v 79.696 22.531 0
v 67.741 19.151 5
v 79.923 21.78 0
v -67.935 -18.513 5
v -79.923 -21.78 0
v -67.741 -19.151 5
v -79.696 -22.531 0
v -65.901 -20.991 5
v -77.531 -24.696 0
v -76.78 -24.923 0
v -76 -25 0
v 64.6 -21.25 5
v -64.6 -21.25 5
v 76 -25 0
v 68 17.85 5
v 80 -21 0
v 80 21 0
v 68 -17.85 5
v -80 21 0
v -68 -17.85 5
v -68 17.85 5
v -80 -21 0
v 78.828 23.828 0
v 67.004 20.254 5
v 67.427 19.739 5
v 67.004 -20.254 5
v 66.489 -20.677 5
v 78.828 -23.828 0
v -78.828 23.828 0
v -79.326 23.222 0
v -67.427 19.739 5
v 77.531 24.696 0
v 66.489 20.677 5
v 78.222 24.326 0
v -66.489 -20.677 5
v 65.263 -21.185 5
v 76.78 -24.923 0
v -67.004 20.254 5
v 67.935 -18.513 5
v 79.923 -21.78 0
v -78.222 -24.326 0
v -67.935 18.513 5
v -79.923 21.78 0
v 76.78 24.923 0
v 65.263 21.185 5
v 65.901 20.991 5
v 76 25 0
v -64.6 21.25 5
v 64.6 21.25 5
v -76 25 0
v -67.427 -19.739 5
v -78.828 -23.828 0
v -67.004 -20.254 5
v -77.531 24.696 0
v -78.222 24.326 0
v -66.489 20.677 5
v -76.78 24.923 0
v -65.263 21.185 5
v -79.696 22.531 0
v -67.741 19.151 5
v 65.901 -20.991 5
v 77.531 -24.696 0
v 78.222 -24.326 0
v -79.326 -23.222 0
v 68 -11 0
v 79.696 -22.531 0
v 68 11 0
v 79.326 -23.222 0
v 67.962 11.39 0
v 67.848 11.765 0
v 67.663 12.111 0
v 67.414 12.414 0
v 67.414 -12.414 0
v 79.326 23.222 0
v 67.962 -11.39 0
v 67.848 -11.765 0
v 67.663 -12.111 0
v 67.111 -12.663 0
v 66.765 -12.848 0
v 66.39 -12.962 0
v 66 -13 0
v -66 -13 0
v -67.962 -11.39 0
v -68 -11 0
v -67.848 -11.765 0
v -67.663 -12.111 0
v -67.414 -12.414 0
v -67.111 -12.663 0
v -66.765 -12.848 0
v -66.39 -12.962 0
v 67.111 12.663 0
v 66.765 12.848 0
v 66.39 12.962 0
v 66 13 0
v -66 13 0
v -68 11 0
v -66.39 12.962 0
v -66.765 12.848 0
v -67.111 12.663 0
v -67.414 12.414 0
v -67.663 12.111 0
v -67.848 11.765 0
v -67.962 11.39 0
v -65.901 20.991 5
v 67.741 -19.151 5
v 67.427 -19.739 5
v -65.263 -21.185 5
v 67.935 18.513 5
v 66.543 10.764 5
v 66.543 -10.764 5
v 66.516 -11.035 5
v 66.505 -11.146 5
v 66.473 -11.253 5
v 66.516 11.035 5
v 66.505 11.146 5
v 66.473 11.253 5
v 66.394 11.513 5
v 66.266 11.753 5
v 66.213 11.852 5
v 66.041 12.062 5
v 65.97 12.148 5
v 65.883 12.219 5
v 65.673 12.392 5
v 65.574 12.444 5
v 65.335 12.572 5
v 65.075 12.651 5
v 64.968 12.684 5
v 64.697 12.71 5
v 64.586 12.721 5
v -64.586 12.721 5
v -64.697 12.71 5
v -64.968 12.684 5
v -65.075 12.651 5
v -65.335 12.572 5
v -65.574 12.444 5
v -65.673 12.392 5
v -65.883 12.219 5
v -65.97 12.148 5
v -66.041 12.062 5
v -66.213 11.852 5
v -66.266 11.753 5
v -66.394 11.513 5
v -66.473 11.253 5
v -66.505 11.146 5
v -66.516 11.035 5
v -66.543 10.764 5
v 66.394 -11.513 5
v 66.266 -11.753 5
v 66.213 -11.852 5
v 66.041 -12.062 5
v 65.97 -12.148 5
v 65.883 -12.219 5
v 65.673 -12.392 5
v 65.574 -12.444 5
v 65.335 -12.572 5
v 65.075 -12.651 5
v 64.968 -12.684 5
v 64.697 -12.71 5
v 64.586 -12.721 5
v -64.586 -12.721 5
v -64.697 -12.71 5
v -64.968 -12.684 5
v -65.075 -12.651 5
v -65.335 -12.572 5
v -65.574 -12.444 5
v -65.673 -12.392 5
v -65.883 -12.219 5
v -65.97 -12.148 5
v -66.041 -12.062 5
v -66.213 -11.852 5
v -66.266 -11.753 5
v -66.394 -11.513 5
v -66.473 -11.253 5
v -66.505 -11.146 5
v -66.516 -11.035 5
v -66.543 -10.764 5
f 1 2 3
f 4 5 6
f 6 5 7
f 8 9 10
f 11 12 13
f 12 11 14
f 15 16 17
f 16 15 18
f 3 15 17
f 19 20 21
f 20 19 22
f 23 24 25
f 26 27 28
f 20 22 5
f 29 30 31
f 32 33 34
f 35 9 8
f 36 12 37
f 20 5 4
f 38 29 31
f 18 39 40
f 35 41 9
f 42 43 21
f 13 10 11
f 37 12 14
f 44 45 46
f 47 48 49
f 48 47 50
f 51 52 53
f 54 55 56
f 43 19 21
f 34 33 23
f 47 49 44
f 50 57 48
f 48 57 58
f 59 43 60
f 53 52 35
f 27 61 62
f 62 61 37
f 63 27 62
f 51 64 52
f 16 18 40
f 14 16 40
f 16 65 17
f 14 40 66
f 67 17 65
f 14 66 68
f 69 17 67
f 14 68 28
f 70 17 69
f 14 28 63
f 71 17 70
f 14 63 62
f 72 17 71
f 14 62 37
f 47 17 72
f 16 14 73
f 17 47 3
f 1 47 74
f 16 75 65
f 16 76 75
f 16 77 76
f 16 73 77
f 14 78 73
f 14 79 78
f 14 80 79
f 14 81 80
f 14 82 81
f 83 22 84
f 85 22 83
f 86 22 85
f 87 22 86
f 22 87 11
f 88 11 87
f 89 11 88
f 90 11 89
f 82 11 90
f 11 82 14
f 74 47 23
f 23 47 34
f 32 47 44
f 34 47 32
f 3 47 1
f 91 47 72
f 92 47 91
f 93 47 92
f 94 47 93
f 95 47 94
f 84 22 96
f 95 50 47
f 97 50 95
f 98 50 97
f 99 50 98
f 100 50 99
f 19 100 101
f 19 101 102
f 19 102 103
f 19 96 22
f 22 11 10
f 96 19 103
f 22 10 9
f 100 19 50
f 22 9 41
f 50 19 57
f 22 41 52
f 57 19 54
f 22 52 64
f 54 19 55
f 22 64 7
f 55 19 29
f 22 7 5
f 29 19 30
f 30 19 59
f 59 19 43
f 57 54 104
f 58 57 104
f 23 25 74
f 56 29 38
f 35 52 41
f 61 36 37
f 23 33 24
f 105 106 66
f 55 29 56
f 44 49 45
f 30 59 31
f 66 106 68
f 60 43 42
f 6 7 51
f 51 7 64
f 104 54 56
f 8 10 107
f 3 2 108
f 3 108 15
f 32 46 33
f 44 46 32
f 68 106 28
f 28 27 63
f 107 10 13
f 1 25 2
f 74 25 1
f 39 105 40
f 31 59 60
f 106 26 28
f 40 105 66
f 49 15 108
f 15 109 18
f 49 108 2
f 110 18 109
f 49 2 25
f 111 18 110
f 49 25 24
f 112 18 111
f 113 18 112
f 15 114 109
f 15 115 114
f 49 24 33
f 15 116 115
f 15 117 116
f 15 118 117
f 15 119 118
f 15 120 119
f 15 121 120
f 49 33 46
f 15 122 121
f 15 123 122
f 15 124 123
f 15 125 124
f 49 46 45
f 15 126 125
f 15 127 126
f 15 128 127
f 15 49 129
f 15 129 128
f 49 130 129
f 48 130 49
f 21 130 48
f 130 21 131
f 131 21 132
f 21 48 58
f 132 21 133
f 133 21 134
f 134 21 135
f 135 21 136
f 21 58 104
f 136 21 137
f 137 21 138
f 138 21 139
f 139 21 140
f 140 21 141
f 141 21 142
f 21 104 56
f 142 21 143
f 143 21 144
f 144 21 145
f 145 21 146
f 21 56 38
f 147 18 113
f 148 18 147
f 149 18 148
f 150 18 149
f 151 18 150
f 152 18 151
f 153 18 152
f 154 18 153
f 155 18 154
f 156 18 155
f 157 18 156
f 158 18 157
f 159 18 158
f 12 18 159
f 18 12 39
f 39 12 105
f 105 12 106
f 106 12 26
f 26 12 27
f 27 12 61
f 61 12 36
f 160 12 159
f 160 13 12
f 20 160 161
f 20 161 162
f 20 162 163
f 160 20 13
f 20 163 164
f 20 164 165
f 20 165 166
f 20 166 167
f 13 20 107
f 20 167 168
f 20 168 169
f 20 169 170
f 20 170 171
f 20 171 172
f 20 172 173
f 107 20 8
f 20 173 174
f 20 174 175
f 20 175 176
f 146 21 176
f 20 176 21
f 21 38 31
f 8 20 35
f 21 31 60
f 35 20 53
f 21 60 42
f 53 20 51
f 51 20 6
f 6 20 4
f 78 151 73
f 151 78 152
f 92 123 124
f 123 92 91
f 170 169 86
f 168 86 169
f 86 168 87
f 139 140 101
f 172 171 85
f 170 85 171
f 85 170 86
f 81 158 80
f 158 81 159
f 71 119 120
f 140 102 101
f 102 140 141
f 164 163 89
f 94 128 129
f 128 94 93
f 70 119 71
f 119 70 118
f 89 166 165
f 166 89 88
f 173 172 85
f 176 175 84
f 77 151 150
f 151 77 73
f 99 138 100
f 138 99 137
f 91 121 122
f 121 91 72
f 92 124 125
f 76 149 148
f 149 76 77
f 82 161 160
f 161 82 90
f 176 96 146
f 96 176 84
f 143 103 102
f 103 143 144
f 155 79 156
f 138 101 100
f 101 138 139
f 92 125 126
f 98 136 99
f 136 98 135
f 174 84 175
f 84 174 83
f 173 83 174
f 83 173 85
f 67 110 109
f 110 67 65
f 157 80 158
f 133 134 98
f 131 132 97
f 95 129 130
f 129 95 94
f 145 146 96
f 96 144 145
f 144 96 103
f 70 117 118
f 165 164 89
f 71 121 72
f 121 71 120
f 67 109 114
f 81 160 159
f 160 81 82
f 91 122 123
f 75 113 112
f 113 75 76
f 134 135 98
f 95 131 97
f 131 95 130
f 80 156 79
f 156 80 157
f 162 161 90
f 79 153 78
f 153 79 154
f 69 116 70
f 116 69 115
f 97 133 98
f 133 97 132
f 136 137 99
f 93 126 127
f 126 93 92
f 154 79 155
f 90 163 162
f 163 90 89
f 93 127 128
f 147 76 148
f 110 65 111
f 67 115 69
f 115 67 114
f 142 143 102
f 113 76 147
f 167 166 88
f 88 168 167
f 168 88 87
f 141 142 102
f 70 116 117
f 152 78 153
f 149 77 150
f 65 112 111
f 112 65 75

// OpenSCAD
$fn = 32;

// ----------------------------------------------------------------------
// Display bezel: 160 x 50 mm frame, opening 136x26 mm
// ----------------------------------------------------------------------

// --- parameters (mm) ---
length = 160;             // frame outside length, X
width = 50;               // frame outside width, Y
frame_w = 12;             // frame width
thickness = 5;            // frame thickness
corner_r = 4;             // outside corner radius
chamfer = 0.85;           // outer wall taper
funnel = 0.97;            // inner opening taper
opening_l = 136;          // opening length
opening_w = 26;           // opening width
inner_r = 2;              // opening corner radius

/* rounded-rectangle outlines, generated with loops */
module rounded_ring(l_nom, w_nom, r) {
  hull() {
    for (sx = [-1, 1]) for (sy = [-1, 1])
      translate([sx * (l_nom / 2 - r), sy * (w_nom / 2 - r)]) circle(r = r);
  }
}

difference() {
  /* frame body, drafted so the outer edge is a variable-depth chamfer */
  linear_extrude(height = thickness, scale = chamfer)
    rounded_ring(length, width, corner_r);
  /* viewing opening, drafted the other way for a funnel edge */
  linear_extrude(height = thickness + 2, scale = funnel)
    translate([0, 0, -1]) rounded_ring(opening_l, opening_w, inner_r);
}
